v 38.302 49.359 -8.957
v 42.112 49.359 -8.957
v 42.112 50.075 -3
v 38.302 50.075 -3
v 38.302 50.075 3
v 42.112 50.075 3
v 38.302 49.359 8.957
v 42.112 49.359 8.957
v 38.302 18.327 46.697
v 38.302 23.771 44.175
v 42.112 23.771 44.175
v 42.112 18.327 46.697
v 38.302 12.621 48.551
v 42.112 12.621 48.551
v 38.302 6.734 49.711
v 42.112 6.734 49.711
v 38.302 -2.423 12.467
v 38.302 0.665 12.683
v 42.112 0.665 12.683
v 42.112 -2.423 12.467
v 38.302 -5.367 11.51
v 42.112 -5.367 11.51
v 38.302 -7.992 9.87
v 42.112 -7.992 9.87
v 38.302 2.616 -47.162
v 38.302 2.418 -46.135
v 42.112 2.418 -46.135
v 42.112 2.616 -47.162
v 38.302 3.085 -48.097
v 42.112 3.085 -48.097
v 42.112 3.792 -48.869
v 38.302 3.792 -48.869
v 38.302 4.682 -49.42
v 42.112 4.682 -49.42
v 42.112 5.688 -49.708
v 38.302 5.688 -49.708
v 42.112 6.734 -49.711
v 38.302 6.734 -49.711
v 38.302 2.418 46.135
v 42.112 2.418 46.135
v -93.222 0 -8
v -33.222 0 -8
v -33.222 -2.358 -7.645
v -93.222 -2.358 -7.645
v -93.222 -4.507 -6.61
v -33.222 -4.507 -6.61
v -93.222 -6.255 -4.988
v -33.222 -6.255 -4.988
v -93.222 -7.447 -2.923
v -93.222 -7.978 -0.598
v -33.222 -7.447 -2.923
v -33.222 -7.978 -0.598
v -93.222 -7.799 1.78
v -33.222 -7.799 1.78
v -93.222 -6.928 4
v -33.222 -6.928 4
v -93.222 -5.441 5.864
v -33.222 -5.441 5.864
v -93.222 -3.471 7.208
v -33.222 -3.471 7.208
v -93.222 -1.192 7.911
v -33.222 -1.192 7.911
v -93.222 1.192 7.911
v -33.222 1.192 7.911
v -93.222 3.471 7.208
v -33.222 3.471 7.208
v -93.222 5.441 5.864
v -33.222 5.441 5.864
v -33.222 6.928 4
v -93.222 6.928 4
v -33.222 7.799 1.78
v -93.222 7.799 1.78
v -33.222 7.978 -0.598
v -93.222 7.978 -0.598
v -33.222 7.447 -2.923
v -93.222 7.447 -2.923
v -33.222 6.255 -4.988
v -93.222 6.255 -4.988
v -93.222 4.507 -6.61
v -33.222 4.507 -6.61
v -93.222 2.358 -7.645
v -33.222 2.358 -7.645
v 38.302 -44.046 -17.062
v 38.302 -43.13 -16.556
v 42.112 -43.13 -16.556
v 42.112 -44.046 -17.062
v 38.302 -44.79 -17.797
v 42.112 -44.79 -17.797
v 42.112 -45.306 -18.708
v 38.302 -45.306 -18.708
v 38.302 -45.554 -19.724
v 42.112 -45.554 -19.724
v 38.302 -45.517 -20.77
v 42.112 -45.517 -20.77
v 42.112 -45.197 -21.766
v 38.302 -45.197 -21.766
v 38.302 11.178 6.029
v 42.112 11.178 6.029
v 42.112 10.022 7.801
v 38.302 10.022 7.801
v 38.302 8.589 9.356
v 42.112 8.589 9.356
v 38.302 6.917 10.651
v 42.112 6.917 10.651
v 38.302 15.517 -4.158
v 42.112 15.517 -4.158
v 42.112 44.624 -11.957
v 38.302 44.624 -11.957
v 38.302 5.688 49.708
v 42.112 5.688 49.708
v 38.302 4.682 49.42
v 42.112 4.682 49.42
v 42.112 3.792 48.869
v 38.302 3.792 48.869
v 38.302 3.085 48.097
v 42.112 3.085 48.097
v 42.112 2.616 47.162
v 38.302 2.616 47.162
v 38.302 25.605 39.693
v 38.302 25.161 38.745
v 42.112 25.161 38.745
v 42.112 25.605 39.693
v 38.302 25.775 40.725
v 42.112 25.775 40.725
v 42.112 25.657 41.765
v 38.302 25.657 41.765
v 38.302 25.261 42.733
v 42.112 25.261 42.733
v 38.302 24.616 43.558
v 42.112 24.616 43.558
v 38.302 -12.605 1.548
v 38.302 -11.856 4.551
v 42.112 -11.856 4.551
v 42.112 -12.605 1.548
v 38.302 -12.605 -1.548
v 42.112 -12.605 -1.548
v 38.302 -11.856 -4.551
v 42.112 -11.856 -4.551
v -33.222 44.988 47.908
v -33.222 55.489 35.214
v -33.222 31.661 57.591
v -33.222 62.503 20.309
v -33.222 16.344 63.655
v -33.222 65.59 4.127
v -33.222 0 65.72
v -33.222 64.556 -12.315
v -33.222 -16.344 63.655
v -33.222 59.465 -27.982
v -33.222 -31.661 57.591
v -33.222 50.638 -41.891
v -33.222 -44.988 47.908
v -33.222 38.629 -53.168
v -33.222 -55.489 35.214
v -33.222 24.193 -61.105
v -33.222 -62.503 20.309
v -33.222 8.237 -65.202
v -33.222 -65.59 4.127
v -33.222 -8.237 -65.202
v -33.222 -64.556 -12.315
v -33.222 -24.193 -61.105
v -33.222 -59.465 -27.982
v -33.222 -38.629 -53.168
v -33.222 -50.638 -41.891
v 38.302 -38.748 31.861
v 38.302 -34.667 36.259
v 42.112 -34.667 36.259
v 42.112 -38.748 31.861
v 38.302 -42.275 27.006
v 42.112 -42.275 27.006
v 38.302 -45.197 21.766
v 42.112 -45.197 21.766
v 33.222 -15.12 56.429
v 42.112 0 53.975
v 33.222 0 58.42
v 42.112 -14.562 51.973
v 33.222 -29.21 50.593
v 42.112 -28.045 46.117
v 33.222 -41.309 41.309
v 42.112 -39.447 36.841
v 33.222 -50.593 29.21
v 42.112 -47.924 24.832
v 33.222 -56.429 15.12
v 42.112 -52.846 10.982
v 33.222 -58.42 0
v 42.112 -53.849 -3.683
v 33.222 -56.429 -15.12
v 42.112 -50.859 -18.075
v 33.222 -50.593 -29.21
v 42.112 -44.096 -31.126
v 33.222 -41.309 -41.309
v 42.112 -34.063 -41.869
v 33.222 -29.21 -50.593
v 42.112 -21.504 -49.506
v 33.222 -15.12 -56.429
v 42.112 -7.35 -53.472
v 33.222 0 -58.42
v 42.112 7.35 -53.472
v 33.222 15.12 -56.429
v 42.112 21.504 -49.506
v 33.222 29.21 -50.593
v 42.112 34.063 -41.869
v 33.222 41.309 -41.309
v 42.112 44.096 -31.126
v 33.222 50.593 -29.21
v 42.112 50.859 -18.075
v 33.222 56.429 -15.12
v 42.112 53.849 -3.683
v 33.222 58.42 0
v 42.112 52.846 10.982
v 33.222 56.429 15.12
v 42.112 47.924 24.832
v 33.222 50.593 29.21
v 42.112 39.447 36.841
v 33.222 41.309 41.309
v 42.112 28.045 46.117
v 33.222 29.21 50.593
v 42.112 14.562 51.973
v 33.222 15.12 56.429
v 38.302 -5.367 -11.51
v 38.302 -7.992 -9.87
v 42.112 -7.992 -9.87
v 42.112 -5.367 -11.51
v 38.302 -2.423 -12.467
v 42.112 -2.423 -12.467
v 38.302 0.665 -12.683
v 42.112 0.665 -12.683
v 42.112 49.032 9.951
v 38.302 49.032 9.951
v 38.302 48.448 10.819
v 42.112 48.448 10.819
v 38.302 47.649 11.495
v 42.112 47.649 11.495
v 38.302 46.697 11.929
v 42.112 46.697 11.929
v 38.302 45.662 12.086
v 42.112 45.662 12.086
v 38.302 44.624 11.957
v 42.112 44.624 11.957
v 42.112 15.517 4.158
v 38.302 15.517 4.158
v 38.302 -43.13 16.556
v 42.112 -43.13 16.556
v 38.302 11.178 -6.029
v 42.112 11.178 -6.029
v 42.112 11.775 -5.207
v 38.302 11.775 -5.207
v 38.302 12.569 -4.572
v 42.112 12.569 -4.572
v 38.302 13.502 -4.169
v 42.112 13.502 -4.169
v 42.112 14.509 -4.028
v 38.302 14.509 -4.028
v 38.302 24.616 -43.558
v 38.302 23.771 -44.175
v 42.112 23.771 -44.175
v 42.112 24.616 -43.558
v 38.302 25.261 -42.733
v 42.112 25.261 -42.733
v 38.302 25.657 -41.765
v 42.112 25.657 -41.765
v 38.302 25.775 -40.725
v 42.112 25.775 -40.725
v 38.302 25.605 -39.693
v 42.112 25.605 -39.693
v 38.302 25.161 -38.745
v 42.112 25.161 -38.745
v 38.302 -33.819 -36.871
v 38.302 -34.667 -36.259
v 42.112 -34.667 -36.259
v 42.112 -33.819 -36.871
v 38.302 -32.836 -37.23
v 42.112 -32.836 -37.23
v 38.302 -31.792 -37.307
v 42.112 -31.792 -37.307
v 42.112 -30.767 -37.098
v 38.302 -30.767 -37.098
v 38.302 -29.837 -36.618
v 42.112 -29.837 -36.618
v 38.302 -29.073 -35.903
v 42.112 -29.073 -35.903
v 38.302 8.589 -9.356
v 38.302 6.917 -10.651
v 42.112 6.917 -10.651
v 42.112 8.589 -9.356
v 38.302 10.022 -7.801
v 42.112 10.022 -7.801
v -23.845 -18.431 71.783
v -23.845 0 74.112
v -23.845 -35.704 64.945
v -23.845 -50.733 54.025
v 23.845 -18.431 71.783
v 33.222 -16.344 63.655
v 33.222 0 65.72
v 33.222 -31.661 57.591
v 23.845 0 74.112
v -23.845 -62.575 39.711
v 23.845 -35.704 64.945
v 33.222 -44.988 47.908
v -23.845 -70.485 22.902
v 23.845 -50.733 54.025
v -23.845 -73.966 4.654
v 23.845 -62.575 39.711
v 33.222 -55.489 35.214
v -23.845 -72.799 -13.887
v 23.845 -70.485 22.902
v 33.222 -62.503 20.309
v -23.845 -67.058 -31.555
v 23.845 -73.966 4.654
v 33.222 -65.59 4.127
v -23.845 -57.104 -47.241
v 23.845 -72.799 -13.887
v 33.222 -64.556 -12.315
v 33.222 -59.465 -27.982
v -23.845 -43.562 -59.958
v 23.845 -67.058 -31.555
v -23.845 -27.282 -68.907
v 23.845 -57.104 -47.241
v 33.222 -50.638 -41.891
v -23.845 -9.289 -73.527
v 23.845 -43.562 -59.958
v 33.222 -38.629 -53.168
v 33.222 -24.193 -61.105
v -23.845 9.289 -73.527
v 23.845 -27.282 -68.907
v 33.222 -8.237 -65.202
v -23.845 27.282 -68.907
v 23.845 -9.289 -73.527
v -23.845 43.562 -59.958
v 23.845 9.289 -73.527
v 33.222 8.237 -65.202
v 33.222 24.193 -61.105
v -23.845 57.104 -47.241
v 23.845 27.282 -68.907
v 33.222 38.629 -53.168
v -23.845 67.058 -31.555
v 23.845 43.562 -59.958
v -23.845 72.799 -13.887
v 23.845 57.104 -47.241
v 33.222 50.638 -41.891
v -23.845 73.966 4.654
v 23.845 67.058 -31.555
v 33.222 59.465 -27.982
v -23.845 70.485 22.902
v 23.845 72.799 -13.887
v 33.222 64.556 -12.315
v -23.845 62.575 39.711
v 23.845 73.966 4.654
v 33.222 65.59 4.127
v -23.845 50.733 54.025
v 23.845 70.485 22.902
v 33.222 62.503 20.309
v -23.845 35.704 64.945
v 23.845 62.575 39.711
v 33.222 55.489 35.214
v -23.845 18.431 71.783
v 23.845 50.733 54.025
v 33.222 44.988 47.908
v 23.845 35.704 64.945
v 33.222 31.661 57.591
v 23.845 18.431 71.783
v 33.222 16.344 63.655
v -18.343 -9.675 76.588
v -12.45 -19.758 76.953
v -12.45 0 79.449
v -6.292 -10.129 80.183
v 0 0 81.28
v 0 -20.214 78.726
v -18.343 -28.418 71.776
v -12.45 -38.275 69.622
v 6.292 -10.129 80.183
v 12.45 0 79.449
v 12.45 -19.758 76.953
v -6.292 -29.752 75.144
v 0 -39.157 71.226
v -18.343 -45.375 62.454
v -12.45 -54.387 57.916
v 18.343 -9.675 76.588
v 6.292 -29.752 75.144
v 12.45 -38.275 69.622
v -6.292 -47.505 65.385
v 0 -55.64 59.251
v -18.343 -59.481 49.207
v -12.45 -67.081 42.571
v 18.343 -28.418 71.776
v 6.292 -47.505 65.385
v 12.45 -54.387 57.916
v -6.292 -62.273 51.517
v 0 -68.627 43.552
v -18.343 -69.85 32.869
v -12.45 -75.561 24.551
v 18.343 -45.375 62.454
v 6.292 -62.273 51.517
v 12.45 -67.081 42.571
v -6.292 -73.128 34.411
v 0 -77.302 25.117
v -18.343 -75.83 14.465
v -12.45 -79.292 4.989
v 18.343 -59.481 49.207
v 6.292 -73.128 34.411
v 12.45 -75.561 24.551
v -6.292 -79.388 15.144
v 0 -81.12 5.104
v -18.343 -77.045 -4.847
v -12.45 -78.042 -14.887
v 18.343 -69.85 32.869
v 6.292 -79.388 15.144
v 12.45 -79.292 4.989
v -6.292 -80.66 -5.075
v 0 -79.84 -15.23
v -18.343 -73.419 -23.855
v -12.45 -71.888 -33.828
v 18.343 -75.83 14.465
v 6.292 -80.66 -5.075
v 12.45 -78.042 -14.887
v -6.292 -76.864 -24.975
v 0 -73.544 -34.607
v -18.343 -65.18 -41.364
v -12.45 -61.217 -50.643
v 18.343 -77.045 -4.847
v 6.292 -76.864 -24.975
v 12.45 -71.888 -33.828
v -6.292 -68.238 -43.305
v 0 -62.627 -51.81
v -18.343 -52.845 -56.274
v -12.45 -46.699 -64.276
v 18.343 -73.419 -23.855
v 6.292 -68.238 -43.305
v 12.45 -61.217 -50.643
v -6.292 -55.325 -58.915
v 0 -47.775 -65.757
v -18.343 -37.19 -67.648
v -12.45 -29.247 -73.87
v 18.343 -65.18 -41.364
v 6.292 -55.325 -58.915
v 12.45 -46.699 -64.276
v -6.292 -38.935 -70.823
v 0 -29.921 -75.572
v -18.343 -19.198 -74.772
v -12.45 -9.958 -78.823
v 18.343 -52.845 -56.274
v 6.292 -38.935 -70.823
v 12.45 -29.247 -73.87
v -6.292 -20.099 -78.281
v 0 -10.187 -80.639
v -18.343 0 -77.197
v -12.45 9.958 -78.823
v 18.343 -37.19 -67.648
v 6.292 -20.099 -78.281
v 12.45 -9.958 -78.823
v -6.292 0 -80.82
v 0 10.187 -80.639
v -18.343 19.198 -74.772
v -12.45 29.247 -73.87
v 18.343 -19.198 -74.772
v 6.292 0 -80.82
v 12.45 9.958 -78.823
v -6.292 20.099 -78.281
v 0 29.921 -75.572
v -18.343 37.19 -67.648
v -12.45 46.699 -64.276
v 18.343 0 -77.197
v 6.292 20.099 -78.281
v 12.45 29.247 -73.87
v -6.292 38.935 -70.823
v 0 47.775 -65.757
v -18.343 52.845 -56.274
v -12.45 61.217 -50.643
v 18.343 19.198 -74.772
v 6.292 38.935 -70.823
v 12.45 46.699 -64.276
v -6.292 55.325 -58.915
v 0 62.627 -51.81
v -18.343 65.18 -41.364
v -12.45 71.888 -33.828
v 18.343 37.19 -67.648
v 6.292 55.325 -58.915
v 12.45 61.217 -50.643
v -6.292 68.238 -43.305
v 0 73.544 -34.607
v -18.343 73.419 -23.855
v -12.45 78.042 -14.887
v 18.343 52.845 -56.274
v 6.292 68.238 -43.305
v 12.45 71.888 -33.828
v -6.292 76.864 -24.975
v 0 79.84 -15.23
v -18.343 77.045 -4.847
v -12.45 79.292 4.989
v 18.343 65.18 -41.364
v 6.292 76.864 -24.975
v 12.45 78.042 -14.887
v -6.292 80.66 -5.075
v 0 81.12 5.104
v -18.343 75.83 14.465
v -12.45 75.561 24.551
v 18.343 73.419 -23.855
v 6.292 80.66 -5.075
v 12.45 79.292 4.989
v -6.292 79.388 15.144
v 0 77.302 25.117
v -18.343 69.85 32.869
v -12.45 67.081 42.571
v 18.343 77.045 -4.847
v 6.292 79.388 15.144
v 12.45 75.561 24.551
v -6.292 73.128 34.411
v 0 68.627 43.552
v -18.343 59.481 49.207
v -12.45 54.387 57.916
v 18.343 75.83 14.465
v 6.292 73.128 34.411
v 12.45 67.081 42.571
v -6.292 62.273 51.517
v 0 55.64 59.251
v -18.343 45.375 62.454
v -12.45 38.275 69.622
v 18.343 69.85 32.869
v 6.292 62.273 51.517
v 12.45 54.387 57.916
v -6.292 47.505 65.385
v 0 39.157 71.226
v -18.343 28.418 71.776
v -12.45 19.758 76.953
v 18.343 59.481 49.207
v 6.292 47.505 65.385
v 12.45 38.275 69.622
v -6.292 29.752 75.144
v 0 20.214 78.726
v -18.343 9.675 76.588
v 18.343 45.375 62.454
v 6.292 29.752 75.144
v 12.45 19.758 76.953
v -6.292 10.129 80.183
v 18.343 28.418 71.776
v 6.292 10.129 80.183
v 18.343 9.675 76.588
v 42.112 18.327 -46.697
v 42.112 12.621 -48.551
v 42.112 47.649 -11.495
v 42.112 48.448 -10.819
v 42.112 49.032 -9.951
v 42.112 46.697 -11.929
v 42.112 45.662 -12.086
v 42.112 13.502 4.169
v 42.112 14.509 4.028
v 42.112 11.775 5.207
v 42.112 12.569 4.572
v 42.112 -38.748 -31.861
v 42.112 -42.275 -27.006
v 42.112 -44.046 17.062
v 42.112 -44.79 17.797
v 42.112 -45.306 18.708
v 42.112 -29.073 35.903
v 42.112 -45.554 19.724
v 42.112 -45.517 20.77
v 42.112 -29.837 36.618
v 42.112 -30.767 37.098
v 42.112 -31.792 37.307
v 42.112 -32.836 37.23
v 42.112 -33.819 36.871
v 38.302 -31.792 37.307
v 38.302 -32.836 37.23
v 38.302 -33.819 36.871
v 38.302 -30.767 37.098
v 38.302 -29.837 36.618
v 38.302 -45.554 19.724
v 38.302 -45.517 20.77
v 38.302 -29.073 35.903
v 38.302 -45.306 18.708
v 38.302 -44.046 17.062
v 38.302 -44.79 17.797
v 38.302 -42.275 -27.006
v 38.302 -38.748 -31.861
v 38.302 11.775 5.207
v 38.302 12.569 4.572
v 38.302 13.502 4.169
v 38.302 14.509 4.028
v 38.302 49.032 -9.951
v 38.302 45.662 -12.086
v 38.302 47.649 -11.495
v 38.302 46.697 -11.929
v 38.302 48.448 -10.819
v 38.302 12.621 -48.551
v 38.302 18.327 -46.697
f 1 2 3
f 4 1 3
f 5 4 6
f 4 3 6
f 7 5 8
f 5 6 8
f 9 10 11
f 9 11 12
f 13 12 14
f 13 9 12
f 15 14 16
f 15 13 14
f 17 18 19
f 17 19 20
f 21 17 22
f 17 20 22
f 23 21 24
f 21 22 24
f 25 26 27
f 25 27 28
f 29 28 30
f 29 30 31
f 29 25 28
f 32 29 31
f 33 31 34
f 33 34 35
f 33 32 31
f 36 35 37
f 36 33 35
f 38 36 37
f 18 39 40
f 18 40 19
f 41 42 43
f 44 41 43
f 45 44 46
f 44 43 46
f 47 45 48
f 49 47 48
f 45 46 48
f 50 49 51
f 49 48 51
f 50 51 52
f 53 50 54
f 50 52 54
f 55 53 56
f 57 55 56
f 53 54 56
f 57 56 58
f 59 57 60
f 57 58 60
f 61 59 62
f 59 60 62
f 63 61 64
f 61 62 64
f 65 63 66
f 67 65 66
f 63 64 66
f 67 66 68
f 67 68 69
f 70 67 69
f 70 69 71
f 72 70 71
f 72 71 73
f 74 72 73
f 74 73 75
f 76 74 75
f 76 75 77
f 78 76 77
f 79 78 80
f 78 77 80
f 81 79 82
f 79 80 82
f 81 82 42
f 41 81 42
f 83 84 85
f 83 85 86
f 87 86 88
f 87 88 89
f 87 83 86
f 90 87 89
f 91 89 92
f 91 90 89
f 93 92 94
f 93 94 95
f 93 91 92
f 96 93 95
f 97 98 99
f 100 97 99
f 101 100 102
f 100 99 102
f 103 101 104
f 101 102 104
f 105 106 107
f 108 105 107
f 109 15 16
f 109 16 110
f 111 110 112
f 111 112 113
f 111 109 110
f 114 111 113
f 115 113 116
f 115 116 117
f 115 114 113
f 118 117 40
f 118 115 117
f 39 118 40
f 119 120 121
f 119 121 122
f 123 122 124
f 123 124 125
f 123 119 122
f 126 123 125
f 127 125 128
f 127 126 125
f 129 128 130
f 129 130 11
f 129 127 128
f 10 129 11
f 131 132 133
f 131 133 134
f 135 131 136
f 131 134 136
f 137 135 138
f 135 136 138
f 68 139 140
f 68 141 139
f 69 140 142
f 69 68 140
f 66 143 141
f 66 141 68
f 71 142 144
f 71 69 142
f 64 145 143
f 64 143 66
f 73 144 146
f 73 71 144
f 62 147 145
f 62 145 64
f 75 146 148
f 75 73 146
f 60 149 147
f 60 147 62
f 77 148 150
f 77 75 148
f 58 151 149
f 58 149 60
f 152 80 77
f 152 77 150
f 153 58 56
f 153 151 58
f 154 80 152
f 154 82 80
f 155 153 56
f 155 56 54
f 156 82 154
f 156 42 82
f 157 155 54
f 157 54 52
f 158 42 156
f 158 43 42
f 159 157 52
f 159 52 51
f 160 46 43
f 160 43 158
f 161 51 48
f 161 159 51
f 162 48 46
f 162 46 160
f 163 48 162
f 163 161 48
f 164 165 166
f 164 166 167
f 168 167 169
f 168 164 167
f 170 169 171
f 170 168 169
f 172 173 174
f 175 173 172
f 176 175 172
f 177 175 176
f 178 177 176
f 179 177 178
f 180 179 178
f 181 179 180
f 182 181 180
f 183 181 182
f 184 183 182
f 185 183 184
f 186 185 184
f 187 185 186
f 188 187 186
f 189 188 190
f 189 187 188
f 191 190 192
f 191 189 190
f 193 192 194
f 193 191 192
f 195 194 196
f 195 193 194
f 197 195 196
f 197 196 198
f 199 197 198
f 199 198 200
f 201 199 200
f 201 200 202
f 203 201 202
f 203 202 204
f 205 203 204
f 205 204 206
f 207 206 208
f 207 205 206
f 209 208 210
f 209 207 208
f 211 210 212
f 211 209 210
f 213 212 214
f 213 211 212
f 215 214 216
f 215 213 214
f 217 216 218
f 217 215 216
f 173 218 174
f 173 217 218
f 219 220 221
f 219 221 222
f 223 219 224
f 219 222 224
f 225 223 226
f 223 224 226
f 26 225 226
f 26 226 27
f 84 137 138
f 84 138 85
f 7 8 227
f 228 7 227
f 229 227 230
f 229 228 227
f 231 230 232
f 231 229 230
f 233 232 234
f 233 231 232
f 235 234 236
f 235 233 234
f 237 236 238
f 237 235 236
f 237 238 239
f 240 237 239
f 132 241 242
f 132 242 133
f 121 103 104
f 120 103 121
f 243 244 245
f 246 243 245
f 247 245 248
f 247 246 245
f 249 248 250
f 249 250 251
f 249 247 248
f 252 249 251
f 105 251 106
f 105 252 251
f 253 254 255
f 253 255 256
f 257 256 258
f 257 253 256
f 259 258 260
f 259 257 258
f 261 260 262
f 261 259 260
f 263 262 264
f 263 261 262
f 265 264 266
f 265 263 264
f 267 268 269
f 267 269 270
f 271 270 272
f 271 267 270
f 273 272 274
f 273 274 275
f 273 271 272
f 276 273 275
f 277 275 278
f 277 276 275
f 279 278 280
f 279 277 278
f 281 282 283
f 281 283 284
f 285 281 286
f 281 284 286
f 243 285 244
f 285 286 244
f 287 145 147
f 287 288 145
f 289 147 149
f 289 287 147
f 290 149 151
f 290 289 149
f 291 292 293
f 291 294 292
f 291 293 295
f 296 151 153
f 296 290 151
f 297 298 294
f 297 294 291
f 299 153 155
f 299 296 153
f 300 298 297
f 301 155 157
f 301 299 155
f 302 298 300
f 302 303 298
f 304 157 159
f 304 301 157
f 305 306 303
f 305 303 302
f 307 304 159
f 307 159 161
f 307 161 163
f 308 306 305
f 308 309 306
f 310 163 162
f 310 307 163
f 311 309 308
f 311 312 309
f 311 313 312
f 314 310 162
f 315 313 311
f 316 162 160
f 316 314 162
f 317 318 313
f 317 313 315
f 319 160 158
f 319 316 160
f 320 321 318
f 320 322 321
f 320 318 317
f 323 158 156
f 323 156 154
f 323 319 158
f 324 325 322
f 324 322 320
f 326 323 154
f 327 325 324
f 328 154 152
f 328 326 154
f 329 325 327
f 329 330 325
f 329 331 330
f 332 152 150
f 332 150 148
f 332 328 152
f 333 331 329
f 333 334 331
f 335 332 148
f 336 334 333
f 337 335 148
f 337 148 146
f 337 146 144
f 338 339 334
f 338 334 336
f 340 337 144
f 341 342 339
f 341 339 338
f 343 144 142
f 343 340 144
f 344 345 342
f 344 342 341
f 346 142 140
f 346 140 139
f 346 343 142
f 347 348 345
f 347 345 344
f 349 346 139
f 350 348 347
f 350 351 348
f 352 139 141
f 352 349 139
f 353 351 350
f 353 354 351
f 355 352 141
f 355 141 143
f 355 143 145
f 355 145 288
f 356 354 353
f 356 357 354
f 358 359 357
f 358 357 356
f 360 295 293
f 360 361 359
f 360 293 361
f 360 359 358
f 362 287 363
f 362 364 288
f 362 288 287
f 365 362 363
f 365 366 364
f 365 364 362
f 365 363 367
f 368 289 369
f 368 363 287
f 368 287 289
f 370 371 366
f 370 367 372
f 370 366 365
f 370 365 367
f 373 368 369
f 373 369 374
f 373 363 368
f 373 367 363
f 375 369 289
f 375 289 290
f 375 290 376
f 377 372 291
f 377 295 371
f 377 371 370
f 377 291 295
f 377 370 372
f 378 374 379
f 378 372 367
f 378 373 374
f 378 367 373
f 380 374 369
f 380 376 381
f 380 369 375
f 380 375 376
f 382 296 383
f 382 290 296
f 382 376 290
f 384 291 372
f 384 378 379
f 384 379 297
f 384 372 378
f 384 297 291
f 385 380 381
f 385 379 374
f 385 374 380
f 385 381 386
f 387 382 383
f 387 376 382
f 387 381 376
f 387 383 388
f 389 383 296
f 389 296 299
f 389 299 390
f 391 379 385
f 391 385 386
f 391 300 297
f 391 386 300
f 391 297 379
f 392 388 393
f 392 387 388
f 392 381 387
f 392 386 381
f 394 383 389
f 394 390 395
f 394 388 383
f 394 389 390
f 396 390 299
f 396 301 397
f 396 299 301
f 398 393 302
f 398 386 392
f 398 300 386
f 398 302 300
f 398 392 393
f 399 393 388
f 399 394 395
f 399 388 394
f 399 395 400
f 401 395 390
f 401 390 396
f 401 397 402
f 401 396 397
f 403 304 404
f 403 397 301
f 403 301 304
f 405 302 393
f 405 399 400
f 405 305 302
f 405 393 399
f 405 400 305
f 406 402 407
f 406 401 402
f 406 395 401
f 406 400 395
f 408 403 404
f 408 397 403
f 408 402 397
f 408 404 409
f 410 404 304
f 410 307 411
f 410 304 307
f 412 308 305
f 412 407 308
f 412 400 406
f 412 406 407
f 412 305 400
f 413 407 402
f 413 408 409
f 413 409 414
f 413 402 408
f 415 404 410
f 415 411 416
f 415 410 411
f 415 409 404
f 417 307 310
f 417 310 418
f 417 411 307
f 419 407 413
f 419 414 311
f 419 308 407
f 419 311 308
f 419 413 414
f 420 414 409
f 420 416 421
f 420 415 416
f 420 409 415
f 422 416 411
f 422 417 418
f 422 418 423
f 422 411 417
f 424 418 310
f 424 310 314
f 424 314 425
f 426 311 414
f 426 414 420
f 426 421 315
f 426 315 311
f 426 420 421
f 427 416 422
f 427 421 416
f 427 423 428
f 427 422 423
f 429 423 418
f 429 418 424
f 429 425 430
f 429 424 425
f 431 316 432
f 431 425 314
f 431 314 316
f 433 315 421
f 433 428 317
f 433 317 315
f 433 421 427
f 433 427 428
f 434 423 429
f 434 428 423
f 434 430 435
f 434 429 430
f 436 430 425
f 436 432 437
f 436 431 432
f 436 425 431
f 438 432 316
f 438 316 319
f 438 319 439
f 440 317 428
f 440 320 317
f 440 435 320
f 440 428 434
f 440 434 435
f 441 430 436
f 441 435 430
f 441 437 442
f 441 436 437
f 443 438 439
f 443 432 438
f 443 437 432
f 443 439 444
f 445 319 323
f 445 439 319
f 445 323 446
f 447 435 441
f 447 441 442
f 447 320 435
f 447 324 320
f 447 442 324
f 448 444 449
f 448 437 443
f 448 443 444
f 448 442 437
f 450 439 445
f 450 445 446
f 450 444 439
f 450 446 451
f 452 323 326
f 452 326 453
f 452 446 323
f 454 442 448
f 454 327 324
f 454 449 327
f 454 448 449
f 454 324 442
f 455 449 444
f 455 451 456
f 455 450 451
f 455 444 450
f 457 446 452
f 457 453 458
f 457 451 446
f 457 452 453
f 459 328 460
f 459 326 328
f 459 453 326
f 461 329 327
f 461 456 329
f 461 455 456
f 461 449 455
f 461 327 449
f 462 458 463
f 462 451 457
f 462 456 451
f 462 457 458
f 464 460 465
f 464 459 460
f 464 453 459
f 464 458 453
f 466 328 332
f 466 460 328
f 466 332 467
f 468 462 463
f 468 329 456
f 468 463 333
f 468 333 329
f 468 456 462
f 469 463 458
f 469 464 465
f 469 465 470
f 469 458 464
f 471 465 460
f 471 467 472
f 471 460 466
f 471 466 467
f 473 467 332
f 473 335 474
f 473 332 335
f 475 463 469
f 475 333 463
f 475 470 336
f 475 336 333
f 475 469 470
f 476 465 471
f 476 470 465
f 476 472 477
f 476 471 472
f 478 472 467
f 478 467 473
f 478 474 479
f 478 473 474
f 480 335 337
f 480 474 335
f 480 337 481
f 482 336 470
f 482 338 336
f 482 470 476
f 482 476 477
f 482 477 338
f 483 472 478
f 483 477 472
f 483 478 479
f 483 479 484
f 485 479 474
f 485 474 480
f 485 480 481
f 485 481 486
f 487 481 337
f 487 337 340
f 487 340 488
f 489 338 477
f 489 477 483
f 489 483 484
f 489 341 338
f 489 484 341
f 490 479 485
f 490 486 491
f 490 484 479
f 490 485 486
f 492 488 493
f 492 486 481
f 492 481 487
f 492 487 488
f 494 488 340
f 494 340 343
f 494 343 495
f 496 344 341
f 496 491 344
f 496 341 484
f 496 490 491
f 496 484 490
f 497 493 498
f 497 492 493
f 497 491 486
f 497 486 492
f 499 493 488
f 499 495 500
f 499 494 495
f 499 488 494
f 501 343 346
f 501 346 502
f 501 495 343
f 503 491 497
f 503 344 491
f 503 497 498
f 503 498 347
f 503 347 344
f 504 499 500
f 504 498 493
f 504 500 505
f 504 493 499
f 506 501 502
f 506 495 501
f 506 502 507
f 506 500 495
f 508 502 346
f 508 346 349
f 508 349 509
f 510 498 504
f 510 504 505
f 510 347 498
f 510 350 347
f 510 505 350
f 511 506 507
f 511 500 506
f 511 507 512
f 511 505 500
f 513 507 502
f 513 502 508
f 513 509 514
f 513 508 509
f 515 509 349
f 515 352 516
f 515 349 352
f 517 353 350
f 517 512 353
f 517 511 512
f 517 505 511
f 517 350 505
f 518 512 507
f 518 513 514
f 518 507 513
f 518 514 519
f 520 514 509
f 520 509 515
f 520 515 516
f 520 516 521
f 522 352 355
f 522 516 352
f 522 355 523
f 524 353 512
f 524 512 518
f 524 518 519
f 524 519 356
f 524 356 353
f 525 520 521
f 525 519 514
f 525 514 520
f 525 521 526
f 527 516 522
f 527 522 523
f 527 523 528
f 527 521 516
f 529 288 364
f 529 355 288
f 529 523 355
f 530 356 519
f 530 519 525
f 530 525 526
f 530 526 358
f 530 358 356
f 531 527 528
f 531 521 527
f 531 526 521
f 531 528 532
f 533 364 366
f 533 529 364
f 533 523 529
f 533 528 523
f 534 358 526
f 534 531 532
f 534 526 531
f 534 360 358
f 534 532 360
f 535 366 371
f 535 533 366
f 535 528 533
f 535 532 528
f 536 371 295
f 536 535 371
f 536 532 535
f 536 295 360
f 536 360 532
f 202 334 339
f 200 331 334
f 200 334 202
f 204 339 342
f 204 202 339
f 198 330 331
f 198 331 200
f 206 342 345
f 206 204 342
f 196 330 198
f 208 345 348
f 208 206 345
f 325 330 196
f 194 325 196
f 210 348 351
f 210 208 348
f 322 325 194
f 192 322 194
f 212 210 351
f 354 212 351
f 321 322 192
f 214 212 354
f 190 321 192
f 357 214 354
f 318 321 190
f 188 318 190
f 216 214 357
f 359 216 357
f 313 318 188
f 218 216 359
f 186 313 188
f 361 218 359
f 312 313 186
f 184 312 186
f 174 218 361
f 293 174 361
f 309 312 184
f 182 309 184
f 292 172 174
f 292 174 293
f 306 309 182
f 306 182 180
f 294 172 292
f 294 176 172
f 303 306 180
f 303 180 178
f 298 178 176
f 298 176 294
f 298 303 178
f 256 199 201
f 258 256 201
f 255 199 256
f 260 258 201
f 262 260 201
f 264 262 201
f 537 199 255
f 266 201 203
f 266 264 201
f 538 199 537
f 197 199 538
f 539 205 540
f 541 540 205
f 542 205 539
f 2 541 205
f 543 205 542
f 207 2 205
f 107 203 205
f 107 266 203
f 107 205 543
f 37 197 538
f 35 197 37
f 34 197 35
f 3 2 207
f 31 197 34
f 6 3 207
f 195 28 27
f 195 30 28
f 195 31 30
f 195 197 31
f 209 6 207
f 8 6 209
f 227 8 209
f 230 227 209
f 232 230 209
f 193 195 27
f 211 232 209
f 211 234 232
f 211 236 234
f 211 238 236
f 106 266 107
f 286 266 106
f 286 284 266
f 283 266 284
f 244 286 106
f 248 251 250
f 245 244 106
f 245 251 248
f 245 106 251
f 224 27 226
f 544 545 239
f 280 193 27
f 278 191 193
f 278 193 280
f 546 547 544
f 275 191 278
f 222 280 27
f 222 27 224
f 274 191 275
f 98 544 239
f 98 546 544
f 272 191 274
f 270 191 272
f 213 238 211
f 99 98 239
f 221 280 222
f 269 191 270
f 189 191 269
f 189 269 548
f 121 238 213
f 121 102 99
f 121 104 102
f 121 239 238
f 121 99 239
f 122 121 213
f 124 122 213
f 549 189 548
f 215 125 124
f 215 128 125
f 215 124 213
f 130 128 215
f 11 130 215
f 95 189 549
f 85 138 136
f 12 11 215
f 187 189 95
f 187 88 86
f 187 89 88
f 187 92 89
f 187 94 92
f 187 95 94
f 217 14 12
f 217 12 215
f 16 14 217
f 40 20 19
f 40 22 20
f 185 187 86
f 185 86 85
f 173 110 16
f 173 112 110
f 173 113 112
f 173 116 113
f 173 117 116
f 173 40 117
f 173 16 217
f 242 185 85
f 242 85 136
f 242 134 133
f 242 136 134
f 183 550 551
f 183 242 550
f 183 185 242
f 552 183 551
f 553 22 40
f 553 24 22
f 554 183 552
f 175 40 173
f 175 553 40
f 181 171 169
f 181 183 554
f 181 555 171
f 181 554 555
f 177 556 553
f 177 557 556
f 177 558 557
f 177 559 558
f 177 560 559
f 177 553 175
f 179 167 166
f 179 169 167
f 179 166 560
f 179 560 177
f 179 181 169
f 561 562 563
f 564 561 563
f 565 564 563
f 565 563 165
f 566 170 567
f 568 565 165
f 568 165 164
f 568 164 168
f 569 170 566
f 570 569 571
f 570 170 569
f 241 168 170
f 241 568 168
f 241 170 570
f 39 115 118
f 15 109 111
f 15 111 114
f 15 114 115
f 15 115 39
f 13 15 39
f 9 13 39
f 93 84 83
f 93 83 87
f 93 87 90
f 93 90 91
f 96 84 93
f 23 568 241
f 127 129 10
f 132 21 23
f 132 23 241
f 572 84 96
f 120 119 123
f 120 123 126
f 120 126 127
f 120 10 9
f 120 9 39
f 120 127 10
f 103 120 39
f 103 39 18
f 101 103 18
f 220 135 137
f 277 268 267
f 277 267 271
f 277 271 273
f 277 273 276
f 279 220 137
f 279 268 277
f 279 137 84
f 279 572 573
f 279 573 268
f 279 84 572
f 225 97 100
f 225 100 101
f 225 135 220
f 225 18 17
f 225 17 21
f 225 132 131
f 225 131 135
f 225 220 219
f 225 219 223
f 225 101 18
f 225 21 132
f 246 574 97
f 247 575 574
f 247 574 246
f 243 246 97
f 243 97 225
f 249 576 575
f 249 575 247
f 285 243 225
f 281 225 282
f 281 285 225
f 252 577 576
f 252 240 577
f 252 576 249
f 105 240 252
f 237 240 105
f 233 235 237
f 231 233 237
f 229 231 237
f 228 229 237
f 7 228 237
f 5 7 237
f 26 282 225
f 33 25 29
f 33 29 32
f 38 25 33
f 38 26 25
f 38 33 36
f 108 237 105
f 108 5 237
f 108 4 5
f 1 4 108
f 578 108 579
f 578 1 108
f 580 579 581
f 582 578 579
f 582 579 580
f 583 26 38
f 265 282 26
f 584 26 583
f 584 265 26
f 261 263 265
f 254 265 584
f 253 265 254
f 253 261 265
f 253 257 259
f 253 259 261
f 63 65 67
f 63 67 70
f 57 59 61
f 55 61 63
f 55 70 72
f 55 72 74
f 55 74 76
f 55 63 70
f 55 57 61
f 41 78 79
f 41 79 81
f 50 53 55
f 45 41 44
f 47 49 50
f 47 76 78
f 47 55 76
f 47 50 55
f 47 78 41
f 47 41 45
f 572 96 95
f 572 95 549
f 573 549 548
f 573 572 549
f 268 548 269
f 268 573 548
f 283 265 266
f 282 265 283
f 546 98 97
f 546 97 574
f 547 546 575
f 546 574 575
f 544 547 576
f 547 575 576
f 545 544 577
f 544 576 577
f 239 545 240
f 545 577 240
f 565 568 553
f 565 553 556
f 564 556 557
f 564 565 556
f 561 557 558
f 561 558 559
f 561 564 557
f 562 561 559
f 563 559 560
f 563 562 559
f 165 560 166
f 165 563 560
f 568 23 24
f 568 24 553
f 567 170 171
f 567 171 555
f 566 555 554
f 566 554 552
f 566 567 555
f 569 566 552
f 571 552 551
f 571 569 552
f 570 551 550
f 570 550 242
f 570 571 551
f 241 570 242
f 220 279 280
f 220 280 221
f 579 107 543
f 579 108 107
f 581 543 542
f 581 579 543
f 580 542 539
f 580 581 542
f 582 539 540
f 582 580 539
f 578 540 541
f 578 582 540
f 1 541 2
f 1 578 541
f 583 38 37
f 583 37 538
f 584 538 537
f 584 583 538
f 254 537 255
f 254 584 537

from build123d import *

# Parameters (mm, degrees)
SKETCH3_R           = 60.325
BOSS_EXTRUDE1_DEPTH = 8.89
CHAMFER1_SIZE       = 12.7
CHAMFER1_SIZE_2     = 6.35
CUT_EXTRUDE1_DEPTH  = 3.81
FILLET1_R           = 3.81
CIRPATTERN1_START   = 38.301794875
CIRPATTERN1_DEPTH   = 3.81
SKETCH5_R           = 8
BOSS_EXTRUDE2_DEPTH = 60


# Read off the part's stored shape, not the designer's step: CirPattern1
with BuildPart() as part:
    # Sketch1 → Revolve1 (revolve)
    with BuildSketch(Plane.XZ, mode=Mode.PRIVATE) as revolve1_sk:
        with BuildLine():
            ThreePointArc((-33.221794875, -65.71974362), (0, -81.28), (33.221794875, -65.71974362))
            Line((33.221794875, -65.71974362), (33.221794875, 0))
            Line((33.221794875, 0), (-33.221794875, 0))
            Line((-33.221794875, 0), (-33.221794875, -65.71974362))
        make_face()
    revolve(revolve1_sk.sketch.rotate(Axis((-33.221794875, 0, 0), (1, 0, 0)), 180), axis=Axis((-33.221794875, 0, 0), (1, 0, 0)))

    # Sketch3 → Boss-Extrude1 (add)
    with BuildSketch(Plane(origin=(33.221794875, 0, 0), x_dir=(0, 0, -1), z_dir=(1, 0, 0))):
        with Locations(Location((0, 0, 0), (0, 0, 180))):
            Circle(SKETCH3_R)
    extrude(amount=BOSS_EXTRUDE1_DEPTH)

    # Chamfer1
    # the kernel refuses this chamfer: 12.7, 6.35 mm, written as the material it takes off along each edge
    with BuildSketch(Plane(origin=(42.111794875, 0, 0), x_dir=(0, 0, 1), z_dir=(0, 1, 0))) as chamfer1_piece_1_section:
        Polygon((60.325, -CHAMFER1_SIZE), (60.325 - CHAMFER1_SIZE_2, 0), (60.325, 0), align=None)
    chamfer1_piece_1 = revolve(axis=Axis((42.111794875, 0, 0), (1, 0, 0)), mode=Mode.PRIVATE)
    chamfer1_piece_1 = split(chamfer1_piece_1, bisect_by=Plane(origin=(33.221794875, 0, -56.304392735), z_dir=(1, 0, 0)), keep=Keep.TOP, mode=Mode.PRIVATE)
    add(chamfer1_piece_1, mode=Mode.SUBTRACT)

    # Sketch4 → Cut-Extrude1 (cut)
    with BuildSketch(Plane(origin=(42.111794875, 0, 0), x_dir=(0, 0, -1), z_dir=(1, 0, 0))):
        with BuildLine():
            ThreePointArc((-3.287001873, 12.267257994), (0, -12.7), (3.287001873, 12.267257994))
            Line((3.287001873, 12.267257994), (12.983657398, 48.455669076))
            ThreePointArc((12.983657398, 48.455669076), (0, 50.165), (-12.983657398, 48.455669076))
            Line((-12.983657398, 48.455669076), (-3.287001873, 12.267257994))
        make_face()
    extrude(amount=-CUT_EXTRUDE1_DEPTH, mode=Mode.SUBTRACT)

    # Fillet1
    fillet1_edges = [part.edges().sort_by_distance(p)[0] for p in [
        (40.206794875, 48.455669076, -12.983657398),
        (40.206794875, 12.267257994, 3.287001873),
        (40.206794875, 48.455669076, 12.983657398),
        (40.206794875, 12.267257994, -3.287001873),
    ]]
    fillet(fillet1_edges, radius=FILLET1_R)

    # CirPattern1 outline → CirPattern1 (cut)
    with BuildSketch(Plane.YZ.offset(CIRPATTERN1_START)):
        with BuildLine():
            ThreePointArc((-29.073443692, 35.902712946), (-31.792302862, 37.307304663), (-34.667331707, 36.258838058))
            ThreePointArc((-34.667331707, 36.258838058), (-40.584337523, 29.486247181), (-45.196998855, 21.765994566))
            ThreePointArc((-45.196998855, 21.765994566), (-45.30571708, 18.70768565), (-43.129697286, 16.55593963))
            Line((-43.129697286, 16.55593963), (-11.856471417, 4.551272959))
            ThreePointArc((-11.856471417, 4.551272959), (-10.274515829, 7.464872704), (-7.992368966, 9.869753711))
            Line((-7.992368966, 9.869753711), (-29.073443692, 35.902712946))
        make_face()
        with BuildLine():
            Line((2.417824845, 46.134846353), (0.664666644, 12.682595091))
            ThreePointArc((0.664666644, 12.682595091), (3.924515829, 12.078417757), (6.916915745, 10.651116213))
            Line((6.916915745, 10.651116213), (25.161320914, 38.745036519))
            ThreePointArc((25.161320914, 38.745036519), (25.656993331, 41.764867961), (23.771409561, 44.175188879))
            ThreePointArc((23.771409561, 44.175188879), (15.501837523, 47.70975014), (6.734050225, 49.710962499))
            ThreePointArc((6.734050225, 49.710962499), (3.791829822, 48.869290246), (2.417824845, 46.134846353))
        make_face()
        with BuildLine():
            ThreePointArc((6.916915745, -10.651116213), (3.924515829, -12.078417757), (0.664666644, -12.682595091))
            Line((0.664666644, -12.682595091), (2.417824845, -46.134846353))
            ThreePointArc((2.417824845, -46.134846353), (3.791829822, -48.869290246), (6.734050225, -49.710962499))
            ThreePointArc((6.734050225, -49.710962499), (15.501837523, -47.70975014), (23.771409561, -44.175188879))
            ThreePointArc((23.771409561, -44.175188879), (25.656993331, -41.764867961), (25.161320914, -38.745036519))
            Line((25.161320914, -38.745036519), (6.916915745, -10.651116213))
        make_face()
        with BuildLine():
            ThreePointArc((-7.992368966, -9.869753711), (-10.274515829, -7.464872704), (-11.856471417, -4.551272959))
            Line((-11.856471417, -4.551272959), (-43.129697286, -16.55593963))
            ThreePointArc((-43.129697286, -16.55593963), (-45.30571708, -18.70768565), (-45.196998855, -21.765994566))
            ThreePointArc((-45.196998855, -21.765994566), (-40.584337523, -29.486247181), (-34.667331707, -36.258838058))
            ThreePointArc((-34.667331707, -36.258838058), (-31.792302862, -37.307304663), (-29.073443692, -35.902712946))
            Line((-29.073443692, -35.902712946), (-7.992368966, -9.869753711))
        make_face()
    extrude(amount=CIRPATTERN1_DEPTH, mode=Mode.SUBTRACT)

    # Sketch5 → Boss-Extrude2 (add)
    with BuildSketch(Plane.ZY.offset(33.221794875)):
        with Locations(Location((0, 0, 0), (0, 0, 180))):
            Circle(SKETCH5_R)
    extrude(amount=BOSS_EXTRUDE2_DEPTH)


solid = part.part
